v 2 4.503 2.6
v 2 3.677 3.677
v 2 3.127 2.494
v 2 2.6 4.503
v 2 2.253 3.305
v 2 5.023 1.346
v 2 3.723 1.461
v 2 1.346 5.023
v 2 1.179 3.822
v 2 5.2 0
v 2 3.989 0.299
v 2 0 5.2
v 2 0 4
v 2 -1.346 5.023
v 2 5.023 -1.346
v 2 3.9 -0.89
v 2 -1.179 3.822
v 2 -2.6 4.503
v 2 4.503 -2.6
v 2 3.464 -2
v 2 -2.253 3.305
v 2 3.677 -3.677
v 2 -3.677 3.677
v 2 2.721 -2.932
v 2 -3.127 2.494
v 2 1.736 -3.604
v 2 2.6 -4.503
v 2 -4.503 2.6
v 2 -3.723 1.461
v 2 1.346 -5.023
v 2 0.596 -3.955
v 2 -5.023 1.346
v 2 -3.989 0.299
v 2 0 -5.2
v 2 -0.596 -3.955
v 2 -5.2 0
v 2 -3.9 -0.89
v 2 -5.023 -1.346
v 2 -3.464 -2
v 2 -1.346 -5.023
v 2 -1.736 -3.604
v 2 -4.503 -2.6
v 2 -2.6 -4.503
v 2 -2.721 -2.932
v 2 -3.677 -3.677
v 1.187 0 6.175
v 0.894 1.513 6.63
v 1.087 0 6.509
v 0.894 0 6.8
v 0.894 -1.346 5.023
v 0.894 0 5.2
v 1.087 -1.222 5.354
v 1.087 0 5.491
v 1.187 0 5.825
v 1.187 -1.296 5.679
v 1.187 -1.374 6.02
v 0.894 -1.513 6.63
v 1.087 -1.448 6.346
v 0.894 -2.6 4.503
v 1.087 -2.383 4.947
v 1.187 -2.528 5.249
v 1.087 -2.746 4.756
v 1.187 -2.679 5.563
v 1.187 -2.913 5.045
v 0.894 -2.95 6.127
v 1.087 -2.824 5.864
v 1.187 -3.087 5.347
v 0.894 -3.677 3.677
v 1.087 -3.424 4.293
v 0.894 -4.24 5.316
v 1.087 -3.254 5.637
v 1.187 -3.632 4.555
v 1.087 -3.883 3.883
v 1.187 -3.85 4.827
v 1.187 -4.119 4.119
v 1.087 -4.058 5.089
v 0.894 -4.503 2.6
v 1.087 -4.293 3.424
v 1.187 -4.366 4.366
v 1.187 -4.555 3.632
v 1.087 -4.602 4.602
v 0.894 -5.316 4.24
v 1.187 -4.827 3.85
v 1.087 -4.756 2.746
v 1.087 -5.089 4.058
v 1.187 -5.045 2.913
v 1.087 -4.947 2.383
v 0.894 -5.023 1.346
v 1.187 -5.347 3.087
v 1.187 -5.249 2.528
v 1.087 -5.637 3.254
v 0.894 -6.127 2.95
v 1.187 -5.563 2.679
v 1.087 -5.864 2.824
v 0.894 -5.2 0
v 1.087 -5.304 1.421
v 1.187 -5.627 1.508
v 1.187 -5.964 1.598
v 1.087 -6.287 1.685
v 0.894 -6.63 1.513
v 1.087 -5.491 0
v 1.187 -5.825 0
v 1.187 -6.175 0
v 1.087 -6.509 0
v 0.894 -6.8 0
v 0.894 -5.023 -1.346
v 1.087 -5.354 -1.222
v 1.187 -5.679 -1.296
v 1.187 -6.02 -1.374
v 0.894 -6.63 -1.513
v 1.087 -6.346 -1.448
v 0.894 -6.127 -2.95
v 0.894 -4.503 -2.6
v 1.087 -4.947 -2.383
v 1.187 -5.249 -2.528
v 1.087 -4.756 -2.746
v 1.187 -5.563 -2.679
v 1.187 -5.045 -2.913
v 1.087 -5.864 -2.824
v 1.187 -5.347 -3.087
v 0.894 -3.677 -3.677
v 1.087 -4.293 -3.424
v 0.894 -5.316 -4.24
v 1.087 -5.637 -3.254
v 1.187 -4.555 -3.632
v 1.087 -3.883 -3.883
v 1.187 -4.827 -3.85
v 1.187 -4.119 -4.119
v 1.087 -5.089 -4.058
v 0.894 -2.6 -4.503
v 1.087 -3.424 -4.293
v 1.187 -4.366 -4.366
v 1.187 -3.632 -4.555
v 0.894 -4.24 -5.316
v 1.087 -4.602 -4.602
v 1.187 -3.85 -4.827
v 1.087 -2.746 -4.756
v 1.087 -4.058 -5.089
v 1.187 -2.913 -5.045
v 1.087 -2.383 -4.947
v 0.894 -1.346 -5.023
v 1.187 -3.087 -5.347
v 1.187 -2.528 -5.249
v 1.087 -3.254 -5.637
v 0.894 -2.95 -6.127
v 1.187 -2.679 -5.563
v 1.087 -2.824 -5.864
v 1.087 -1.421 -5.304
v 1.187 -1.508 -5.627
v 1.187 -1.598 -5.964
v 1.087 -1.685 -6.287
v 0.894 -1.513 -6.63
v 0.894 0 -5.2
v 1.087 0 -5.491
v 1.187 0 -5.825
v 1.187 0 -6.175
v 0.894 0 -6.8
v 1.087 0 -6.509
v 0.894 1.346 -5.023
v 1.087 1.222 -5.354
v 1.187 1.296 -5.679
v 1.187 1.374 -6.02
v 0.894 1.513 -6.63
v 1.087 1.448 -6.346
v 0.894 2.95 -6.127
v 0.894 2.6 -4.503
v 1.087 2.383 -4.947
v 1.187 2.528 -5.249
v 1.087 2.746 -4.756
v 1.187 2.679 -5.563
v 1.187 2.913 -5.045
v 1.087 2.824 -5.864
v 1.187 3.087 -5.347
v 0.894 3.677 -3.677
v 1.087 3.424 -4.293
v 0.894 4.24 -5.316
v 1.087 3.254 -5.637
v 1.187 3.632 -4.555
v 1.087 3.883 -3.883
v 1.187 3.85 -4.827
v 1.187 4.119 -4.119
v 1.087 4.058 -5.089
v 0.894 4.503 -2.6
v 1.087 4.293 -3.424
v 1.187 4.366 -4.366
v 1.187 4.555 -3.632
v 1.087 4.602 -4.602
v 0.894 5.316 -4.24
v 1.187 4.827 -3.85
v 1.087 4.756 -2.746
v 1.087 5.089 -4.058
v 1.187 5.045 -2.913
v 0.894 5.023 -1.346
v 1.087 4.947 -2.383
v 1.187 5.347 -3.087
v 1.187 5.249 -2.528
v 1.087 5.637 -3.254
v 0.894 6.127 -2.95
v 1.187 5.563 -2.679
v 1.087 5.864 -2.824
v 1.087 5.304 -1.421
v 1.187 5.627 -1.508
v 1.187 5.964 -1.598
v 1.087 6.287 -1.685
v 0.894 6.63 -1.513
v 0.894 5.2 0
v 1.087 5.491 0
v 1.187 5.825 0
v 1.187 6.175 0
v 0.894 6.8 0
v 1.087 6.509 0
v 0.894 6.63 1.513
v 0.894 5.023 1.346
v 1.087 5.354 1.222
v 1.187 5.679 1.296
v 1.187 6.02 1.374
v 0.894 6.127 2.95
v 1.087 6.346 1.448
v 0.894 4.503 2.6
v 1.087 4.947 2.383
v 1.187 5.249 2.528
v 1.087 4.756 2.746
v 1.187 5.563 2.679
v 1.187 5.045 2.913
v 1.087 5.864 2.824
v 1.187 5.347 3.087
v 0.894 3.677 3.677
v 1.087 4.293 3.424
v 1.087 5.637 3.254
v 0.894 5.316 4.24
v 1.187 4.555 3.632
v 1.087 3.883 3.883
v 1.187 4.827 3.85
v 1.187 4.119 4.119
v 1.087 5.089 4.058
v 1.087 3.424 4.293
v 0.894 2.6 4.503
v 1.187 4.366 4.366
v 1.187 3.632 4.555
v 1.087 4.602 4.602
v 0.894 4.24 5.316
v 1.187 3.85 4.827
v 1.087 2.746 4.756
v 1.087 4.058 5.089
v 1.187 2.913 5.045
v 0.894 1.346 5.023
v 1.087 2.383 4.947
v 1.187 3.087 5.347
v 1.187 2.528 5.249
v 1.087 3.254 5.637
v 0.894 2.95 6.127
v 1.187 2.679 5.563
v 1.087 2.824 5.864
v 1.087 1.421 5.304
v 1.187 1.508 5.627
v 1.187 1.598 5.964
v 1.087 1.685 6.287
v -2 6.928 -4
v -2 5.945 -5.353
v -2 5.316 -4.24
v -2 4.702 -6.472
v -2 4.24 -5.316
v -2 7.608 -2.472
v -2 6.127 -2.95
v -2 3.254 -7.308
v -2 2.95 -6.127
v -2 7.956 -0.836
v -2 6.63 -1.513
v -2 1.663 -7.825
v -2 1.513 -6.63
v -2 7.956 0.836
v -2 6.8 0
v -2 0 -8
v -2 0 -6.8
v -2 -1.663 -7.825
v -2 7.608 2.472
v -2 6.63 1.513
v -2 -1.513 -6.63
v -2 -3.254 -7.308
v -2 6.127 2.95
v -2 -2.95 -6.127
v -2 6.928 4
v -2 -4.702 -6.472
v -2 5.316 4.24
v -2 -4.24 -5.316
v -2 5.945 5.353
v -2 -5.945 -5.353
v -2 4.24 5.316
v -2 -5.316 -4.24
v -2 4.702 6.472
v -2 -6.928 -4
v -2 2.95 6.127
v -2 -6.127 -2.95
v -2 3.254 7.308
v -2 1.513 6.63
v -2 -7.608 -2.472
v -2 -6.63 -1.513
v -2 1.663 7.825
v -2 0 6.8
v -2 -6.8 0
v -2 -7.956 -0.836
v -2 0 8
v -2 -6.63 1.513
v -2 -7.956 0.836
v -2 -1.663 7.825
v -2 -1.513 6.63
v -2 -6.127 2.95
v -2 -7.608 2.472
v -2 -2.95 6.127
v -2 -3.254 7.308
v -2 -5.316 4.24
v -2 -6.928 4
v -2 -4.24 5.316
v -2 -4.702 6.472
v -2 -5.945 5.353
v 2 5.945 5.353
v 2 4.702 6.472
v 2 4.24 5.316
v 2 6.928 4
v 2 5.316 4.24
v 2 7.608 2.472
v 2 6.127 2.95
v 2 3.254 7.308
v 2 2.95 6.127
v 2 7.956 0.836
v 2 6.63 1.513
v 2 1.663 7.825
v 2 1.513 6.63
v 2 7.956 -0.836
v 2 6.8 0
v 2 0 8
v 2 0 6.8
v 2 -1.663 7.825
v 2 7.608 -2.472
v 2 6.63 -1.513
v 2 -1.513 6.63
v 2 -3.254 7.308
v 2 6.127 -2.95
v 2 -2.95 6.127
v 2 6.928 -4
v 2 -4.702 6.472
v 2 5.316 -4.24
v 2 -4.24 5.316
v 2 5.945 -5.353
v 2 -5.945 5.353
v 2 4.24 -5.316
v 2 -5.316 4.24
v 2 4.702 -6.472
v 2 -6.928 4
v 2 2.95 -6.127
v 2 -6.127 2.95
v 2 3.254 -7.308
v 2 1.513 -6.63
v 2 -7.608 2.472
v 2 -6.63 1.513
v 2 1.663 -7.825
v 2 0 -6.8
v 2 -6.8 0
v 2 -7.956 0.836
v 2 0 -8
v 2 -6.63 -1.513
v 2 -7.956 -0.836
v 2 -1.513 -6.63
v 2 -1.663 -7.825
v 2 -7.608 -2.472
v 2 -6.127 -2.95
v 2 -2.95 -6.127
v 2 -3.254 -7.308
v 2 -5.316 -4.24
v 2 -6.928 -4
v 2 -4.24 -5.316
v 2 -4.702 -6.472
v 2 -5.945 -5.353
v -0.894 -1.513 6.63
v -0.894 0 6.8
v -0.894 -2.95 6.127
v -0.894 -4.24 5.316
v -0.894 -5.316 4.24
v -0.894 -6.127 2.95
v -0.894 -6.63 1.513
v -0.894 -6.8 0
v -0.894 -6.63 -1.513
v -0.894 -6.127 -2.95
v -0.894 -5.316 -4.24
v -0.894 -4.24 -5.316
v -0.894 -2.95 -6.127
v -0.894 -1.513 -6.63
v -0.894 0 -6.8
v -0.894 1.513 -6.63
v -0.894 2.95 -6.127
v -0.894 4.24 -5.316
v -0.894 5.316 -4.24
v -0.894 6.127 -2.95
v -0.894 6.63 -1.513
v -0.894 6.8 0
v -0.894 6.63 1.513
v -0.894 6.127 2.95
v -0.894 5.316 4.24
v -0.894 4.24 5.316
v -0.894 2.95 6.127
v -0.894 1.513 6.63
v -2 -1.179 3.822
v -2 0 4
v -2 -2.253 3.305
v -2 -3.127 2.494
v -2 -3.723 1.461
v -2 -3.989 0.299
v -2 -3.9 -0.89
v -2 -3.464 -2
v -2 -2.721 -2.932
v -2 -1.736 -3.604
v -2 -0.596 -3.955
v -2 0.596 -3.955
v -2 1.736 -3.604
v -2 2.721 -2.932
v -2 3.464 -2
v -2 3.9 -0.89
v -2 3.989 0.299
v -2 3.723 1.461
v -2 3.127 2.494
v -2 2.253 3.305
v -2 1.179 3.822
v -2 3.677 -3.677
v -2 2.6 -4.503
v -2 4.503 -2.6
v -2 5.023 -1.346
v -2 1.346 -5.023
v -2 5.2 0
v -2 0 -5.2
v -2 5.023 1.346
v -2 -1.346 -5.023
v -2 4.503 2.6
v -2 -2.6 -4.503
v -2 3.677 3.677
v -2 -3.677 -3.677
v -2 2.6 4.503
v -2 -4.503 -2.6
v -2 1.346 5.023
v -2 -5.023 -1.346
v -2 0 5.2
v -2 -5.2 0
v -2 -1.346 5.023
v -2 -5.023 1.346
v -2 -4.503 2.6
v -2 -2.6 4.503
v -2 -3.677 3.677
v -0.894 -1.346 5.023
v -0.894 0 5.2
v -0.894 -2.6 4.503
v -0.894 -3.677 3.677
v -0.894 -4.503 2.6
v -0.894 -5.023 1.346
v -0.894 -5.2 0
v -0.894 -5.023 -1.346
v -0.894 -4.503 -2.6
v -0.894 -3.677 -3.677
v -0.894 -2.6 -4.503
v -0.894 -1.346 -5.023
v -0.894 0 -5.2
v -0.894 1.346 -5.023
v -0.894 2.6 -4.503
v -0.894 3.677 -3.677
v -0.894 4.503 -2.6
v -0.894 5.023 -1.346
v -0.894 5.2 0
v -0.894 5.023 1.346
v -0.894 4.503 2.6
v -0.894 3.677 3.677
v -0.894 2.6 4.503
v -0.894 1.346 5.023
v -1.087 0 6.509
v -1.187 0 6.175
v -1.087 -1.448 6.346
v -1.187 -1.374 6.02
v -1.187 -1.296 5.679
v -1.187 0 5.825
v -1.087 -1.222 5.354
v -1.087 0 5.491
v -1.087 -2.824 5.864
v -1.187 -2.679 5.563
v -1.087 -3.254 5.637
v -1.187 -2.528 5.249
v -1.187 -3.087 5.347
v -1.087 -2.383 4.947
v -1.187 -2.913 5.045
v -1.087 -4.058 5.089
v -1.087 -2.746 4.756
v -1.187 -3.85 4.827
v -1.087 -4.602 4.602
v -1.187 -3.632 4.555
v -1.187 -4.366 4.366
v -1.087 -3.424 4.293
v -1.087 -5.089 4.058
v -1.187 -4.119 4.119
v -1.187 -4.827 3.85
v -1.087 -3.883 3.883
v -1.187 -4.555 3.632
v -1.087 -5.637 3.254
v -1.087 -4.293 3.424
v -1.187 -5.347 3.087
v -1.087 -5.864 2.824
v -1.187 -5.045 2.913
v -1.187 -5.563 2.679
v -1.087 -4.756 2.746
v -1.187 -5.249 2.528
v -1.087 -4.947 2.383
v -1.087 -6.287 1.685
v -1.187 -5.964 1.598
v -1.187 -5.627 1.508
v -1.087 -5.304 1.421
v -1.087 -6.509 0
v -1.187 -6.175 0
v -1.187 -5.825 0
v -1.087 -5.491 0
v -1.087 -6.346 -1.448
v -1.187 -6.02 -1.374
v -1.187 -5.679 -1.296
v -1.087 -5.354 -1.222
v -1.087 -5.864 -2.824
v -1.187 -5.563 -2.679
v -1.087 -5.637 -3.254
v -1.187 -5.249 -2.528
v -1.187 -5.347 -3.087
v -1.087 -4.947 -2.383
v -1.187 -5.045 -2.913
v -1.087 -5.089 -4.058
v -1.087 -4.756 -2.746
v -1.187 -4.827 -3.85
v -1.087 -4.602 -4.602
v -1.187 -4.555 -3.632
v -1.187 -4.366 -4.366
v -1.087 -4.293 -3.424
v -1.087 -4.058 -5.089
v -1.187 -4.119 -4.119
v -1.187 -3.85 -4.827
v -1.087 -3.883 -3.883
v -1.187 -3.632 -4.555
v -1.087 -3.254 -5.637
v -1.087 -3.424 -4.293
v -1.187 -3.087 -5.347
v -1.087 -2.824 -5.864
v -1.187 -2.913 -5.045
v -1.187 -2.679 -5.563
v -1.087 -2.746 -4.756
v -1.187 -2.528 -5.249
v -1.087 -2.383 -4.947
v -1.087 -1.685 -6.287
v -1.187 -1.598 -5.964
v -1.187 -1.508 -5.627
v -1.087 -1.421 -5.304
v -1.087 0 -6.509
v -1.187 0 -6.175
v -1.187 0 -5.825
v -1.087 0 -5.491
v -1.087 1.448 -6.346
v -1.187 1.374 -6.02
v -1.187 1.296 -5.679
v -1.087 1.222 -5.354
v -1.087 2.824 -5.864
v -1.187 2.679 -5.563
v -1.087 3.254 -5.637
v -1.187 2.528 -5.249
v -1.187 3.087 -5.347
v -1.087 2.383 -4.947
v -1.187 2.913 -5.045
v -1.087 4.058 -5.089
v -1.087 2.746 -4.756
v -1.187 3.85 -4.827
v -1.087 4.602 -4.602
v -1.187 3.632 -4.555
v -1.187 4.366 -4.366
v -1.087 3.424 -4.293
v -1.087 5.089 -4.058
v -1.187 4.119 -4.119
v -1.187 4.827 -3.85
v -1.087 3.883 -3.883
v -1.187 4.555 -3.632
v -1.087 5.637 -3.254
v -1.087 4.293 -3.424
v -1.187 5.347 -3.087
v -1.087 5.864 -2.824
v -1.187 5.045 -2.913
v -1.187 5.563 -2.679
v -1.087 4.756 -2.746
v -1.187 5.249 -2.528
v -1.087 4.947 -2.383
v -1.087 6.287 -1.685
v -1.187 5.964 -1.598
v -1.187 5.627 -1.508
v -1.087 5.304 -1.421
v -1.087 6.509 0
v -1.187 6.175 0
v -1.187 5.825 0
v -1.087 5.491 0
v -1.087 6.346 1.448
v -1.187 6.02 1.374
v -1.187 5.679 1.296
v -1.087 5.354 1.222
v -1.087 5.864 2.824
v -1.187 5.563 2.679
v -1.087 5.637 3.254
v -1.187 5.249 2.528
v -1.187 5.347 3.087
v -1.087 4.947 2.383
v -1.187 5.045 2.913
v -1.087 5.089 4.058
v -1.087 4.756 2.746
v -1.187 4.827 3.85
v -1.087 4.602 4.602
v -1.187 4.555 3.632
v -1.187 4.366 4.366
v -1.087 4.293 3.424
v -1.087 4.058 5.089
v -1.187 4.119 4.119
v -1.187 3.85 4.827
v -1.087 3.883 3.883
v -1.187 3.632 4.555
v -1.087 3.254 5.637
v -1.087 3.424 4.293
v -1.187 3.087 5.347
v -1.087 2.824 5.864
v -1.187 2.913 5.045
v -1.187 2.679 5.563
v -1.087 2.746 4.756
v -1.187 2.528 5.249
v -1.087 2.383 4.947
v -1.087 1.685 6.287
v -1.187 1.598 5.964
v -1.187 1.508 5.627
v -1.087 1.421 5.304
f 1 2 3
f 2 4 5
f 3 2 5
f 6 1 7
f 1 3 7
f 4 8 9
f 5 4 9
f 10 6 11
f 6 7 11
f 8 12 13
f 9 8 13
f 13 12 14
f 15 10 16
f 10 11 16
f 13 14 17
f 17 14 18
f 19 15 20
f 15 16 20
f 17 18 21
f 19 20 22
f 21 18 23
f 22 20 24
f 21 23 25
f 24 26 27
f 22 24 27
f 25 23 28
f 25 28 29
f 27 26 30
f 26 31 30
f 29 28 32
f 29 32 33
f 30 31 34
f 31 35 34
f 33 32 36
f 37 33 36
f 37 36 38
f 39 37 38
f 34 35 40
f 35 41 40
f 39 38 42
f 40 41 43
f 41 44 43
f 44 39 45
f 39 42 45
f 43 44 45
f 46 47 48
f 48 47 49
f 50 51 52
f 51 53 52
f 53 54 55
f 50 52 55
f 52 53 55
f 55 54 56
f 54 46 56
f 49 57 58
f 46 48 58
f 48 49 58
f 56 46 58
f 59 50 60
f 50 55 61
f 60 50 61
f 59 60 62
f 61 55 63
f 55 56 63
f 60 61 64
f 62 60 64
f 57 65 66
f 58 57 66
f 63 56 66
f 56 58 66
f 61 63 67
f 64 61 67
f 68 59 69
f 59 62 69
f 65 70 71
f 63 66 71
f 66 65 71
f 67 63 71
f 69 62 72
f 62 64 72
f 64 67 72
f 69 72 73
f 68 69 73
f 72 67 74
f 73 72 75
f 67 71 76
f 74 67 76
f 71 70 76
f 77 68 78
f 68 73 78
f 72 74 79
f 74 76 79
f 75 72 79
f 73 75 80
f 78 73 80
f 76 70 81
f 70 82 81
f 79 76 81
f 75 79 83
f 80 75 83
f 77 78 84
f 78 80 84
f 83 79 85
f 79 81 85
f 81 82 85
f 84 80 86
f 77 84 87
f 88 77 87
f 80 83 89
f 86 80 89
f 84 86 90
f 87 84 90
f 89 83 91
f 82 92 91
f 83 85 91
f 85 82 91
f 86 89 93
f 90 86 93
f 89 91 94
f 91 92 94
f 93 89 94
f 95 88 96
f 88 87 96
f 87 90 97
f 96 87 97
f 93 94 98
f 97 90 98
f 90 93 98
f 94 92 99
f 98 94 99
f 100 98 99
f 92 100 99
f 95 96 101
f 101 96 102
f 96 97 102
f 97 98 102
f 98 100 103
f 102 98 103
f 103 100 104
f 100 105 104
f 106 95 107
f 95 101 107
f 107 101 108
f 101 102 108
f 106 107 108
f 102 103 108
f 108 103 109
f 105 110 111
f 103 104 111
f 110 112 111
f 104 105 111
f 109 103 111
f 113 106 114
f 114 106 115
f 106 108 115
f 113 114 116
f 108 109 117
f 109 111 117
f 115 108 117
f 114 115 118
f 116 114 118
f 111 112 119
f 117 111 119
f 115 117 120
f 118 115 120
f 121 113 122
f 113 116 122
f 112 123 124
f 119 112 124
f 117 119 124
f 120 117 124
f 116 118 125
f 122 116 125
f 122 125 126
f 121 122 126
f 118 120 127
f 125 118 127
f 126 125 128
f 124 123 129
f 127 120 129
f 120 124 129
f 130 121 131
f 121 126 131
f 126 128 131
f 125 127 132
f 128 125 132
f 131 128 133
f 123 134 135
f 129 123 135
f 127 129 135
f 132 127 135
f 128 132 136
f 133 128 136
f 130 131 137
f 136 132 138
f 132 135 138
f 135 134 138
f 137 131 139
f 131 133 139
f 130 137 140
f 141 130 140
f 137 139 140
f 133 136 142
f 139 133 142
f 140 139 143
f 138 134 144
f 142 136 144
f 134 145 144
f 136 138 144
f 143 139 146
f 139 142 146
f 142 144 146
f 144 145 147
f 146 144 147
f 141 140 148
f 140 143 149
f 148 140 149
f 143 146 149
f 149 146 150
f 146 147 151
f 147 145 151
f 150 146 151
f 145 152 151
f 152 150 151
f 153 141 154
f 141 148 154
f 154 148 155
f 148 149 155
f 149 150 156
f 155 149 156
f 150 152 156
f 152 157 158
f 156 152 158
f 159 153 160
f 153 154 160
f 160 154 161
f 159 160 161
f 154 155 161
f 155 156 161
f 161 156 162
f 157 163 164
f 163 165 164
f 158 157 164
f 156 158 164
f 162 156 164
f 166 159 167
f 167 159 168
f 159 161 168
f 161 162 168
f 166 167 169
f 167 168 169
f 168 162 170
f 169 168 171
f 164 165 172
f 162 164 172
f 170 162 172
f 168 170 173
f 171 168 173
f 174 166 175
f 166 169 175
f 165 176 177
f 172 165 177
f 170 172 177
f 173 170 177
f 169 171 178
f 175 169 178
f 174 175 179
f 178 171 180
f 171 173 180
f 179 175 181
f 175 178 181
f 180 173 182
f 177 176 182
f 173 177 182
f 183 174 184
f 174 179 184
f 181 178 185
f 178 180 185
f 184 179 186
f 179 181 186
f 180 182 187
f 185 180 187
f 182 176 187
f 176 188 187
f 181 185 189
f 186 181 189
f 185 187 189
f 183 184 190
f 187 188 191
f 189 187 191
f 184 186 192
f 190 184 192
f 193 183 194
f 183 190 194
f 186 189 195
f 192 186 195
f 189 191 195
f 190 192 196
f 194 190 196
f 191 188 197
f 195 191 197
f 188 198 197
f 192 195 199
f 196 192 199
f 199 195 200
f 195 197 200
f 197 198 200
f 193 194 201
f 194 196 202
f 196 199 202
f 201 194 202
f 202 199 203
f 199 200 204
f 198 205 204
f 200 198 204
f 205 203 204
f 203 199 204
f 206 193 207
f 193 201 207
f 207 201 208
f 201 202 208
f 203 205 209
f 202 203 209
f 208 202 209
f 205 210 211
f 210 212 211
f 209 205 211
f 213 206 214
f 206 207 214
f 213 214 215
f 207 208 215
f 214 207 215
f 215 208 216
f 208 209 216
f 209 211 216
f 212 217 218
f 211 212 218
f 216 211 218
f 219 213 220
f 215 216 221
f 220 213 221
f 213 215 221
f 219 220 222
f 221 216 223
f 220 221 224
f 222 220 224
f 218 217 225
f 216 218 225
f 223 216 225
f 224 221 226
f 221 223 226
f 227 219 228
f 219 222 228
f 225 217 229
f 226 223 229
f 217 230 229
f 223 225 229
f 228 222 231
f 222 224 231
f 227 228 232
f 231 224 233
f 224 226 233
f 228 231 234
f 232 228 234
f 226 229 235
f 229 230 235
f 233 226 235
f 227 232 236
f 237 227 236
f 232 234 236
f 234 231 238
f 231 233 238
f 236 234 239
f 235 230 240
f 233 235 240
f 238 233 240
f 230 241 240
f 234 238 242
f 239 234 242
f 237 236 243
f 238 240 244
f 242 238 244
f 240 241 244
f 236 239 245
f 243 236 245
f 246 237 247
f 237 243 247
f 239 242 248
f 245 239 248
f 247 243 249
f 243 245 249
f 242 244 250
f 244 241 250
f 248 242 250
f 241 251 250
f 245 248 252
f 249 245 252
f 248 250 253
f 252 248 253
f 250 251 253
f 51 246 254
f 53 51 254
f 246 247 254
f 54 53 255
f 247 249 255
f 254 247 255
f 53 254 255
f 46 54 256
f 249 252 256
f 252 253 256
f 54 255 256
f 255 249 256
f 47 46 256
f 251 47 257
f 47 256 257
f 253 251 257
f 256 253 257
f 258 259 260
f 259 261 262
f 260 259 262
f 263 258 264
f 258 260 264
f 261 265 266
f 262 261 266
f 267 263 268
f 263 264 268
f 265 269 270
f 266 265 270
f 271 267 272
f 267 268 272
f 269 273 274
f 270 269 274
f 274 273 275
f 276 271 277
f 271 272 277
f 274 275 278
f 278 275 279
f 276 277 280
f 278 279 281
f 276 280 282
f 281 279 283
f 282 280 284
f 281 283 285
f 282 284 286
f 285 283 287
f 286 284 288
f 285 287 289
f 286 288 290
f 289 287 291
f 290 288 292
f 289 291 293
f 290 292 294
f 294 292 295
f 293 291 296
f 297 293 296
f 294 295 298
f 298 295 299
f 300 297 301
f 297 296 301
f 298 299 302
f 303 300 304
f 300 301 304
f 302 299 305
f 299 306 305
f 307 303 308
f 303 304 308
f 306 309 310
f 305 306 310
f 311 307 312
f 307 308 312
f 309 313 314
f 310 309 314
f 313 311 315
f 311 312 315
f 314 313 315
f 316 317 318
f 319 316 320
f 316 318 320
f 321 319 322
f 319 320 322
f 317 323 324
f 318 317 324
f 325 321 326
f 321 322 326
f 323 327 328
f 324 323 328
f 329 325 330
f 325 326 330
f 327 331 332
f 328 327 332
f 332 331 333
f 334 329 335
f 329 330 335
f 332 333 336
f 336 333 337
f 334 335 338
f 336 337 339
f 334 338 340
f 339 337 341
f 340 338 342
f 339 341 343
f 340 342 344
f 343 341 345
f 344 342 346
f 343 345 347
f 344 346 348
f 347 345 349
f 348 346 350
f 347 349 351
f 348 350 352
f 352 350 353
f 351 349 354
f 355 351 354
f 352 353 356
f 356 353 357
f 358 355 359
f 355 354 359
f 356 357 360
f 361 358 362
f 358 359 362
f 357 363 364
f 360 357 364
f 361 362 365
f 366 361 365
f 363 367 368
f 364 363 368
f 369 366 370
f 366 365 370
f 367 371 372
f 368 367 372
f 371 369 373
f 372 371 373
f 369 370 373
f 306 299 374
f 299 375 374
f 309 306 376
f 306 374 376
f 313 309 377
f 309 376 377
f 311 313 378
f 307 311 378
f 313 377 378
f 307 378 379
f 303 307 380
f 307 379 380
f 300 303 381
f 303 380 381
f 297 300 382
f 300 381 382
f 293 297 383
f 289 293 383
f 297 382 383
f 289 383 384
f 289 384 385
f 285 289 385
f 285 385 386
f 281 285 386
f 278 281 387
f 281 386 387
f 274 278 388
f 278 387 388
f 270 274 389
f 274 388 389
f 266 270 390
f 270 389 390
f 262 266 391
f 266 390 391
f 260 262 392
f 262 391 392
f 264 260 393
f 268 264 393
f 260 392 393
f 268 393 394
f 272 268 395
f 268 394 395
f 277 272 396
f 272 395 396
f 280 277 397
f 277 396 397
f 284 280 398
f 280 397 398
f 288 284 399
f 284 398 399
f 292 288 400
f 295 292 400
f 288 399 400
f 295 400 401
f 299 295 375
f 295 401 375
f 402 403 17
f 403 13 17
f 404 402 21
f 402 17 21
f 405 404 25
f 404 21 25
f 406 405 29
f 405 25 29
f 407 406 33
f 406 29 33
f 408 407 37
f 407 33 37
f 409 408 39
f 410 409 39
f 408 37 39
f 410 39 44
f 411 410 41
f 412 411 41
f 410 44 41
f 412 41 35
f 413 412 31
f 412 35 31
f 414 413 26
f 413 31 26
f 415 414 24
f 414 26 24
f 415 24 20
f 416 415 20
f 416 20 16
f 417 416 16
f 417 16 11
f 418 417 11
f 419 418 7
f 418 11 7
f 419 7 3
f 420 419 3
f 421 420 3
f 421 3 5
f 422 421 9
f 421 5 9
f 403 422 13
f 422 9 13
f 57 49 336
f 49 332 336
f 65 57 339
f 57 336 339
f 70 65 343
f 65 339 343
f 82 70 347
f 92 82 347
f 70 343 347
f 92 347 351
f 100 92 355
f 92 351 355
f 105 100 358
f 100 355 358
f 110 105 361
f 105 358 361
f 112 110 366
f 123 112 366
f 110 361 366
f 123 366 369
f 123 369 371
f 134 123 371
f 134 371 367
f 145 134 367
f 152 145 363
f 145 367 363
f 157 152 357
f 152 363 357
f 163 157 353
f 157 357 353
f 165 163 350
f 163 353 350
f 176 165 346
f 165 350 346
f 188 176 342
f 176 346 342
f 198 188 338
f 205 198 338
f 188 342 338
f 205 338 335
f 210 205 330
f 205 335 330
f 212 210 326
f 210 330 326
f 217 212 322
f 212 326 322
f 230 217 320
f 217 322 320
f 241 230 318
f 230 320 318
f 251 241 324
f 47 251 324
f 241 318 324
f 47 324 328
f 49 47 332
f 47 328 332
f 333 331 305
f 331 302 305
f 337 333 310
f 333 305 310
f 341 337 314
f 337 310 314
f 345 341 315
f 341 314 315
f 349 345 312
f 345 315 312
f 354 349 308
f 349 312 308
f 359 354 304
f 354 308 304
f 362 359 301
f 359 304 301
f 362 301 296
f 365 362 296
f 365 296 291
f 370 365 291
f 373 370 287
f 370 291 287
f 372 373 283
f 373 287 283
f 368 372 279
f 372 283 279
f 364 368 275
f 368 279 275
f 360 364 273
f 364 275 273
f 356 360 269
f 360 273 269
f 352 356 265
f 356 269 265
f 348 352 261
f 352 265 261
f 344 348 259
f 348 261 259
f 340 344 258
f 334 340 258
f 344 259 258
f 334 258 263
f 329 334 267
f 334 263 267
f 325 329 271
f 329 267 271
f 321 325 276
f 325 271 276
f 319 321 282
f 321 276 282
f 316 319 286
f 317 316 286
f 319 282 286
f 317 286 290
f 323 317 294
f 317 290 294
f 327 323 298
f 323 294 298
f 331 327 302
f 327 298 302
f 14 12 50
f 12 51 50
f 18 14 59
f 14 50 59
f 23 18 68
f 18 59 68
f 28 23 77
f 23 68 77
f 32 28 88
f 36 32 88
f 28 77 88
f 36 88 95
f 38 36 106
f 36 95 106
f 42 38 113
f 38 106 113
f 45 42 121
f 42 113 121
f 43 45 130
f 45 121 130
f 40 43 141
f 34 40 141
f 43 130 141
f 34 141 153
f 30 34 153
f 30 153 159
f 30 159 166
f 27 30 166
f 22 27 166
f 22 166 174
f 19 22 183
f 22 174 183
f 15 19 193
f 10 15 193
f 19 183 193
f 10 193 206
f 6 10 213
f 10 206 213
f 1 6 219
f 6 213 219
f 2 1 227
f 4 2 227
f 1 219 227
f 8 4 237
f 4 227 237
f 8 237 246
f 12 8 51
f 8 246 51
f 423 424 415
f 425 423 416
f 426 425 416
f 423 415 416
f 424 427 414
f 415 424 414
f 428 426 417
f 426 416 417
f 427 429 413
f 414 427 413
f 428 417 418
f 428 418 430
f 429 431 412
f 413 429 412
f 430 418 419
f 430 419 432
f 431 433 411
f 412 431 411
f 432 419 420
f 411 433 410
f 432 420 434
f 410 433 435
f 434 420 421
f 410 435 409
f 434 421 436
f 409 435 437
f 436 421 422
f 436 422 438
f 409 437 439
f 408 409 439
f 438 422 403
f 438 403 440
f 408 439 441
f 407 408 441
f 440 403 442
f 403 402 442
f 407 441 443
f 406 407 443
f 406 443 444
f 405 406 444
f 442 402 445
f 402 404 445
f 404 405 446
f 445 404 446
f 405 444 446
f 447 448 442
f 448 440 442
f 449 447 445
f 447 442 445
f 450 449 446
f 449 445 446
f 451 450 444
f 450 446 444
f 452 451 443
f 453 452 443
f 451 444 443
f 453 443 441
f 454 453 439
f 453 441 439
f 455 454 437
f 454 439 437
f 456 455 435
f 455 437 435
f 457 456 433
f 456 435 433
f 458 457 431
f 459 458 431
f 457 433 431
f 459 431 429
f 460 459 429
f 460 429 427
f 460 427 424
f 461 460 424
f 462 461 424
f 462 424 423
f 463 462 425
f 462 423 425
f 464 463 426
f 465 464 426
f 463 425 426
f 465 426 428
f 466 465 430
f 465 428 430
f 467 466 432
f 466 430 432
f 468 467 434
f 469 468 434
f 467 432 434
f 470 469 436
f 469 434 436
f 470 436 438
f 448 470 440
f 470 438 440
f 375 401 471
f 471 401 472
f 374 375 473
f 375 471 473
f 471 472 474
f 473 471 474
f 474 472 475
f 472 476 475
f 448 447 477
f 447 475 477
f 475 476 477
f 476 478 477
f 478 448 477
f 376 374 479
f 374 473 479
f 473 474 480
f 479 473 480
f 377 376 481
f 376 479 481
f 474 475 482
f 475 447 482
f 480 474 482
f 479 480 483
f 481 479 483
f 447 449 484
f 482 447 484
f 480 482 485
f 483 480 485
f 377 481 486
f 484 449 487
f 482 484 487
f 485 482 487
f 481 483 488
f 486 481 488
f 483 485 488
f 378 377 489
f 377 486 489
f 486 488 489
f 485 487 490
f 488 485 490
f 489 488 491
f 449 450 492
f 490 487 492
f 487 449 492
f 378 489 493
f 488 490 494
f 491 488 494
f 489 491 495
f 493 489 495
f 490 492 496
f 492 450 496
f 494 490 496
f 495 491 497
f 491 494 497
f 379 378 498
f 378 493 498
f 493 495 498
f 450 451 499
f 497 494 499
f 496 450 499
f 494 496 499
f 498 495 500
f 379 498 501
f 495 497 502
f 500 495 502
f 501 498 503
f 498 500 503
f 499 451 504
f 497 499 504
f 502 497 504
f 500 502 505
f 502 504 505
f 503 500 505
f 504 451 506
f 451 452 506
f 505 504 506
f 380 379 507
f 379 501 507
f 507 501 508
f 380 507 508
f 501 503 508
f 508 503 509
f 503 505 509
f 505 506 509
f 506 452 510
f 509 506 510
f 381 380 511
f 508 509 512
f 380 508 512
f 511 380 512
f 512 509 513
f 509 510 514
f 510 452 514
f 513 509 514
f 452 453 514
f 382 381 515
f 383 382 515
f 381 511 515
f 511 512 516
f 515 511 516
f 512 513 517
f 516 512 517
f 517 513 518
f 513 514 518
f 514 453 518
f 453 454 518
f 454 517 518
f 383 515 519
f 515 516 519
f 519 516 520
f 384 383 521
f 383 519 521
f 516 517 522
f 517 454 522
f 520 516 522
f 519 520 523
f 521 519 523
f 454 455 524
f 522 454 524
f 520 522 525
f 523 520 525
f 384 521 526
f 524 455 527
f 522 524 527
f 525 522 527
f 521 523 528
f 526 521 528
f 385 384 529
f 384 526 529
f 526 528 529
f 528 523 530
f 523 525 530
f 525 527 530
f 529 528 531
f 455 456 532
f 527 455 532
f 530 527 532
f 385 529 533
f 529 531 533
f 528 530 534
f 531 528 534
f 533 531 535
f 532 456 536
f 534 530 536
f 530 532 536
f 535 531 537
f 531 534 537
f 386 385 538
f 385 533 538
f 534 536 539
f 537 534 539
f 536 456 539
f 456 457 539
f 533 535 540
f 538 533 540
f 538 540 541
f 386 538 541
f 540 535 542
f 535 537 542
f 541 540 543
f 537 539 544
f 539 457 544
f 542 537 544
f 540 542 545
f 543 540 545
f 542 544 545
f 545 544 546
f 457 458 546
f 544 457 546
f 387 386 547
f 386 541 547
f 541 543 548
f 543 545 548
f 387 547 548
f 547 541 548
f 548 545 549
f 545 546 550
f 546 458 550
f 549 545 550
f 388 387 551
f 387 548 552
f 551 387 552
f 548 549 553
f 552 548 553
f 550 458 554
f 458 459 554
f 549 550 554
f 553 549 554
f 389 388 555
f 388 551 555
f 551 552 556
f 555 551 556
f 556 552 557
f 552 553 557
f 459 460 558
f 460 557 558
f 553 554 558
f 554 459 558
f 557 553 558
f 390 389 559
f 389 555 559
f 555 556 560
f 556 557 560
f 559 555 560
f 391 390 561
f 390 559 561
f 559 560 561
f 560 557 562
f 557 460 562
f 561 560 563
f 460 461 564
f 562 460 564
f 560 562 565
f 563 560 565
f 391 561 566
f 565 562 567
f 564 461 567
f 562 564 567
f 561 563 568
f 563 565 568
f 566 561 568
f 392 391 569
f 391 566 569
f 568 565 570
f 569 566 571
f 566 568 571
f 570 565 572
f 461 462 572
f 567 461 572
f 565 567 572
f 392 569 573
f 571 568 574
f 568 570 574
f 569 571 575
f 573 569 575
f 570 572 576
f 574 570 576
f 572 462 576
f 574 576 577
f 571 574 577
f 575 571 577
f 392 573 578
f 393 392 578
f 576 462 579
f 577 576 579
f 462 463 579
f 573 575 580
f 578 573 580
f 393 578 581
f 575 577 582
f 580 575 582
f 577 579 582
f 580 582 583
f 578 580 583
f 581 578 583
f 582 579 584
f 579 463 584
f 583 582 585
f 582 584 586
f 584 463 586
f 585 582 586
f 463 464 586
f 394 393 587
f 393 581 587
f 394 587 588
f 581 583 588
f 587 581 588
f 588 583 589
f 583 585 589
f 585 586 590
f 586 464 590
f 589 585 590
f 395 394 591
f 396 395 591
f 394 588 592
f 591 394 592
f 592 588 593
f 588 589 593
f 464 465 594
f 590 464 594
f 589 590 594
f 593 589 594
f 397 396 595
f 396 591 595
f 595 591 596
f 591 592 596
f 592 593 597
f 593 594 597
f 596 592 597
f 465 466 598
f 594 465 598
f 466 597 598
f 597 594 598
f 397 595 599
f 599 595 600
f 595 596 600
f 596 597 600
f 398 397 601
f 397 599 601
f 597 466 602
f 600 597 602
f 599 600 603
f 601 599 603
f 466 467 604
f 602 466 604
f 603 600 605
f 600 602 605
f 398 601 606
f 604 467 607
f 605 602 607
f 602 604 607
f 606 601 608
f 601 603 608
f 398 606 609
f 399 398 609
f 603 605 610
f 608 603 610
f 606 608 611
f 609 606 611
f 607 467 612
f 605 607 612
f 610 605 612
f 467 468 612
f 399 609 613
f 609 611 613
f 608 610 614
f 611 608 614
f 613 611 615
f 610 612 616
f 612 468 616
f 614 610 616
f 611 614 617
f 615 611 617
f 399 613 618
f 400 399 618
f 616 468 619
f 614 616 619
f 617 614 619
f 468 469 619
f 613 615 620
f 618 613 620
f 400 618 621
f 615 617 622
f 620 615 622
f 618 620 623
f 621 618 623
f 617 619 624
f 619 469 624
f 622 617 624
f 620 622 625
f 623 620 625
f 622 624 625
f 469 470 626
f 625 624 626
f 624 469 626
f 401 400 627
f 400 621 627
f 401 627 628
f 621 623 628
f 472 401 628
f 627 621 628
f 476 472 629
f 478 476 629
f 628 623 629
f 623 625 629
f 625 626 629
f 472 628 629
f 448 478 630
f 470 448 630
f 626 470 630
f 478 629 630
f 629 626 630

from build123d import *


with BuildPart() as part:
    # Esquisse1 → Révolution1 (revolve)
    with BuildSketch(Plane.XY, mode=Mode.PRIVATE) as r_volution1_sk:
        with BuildLine():
            Line((-2, 4), (2, 4))
            Line((2, 4), (2, 5.2))
            Line((2, 5.2), (0.894427191, 5.2))
            ThreePointArc((0.894427191, 5.2), (1.2, 6), (0.894427191, 6.8))
            Line((0.894427191, 6.8), (2, 6.8))
            Line((2, 6.8), (2, 8))
            Line((2, 8), (-2, 8))
            Line((-2, 8), (-2, 6.8))
            Line((-2, 6.8), (-0.894427191, 6.8))
            ThreePointArc((-0.894427191, 6.8), (-1.2, 6), (-0.894427191, 5.2))
            Line((-0.894427191, 5.2), (-2, 5.2))
            Line((-2, 5.2), (-2, 4))
        make_face()
    revolve(r_volution1_sk.sketch.rotate(Axis((-2, 0, 0), (1, 0, 0)), 90), axis=Axis((-2, 0, 0), (1, 0, 0)))


solid = part.part
